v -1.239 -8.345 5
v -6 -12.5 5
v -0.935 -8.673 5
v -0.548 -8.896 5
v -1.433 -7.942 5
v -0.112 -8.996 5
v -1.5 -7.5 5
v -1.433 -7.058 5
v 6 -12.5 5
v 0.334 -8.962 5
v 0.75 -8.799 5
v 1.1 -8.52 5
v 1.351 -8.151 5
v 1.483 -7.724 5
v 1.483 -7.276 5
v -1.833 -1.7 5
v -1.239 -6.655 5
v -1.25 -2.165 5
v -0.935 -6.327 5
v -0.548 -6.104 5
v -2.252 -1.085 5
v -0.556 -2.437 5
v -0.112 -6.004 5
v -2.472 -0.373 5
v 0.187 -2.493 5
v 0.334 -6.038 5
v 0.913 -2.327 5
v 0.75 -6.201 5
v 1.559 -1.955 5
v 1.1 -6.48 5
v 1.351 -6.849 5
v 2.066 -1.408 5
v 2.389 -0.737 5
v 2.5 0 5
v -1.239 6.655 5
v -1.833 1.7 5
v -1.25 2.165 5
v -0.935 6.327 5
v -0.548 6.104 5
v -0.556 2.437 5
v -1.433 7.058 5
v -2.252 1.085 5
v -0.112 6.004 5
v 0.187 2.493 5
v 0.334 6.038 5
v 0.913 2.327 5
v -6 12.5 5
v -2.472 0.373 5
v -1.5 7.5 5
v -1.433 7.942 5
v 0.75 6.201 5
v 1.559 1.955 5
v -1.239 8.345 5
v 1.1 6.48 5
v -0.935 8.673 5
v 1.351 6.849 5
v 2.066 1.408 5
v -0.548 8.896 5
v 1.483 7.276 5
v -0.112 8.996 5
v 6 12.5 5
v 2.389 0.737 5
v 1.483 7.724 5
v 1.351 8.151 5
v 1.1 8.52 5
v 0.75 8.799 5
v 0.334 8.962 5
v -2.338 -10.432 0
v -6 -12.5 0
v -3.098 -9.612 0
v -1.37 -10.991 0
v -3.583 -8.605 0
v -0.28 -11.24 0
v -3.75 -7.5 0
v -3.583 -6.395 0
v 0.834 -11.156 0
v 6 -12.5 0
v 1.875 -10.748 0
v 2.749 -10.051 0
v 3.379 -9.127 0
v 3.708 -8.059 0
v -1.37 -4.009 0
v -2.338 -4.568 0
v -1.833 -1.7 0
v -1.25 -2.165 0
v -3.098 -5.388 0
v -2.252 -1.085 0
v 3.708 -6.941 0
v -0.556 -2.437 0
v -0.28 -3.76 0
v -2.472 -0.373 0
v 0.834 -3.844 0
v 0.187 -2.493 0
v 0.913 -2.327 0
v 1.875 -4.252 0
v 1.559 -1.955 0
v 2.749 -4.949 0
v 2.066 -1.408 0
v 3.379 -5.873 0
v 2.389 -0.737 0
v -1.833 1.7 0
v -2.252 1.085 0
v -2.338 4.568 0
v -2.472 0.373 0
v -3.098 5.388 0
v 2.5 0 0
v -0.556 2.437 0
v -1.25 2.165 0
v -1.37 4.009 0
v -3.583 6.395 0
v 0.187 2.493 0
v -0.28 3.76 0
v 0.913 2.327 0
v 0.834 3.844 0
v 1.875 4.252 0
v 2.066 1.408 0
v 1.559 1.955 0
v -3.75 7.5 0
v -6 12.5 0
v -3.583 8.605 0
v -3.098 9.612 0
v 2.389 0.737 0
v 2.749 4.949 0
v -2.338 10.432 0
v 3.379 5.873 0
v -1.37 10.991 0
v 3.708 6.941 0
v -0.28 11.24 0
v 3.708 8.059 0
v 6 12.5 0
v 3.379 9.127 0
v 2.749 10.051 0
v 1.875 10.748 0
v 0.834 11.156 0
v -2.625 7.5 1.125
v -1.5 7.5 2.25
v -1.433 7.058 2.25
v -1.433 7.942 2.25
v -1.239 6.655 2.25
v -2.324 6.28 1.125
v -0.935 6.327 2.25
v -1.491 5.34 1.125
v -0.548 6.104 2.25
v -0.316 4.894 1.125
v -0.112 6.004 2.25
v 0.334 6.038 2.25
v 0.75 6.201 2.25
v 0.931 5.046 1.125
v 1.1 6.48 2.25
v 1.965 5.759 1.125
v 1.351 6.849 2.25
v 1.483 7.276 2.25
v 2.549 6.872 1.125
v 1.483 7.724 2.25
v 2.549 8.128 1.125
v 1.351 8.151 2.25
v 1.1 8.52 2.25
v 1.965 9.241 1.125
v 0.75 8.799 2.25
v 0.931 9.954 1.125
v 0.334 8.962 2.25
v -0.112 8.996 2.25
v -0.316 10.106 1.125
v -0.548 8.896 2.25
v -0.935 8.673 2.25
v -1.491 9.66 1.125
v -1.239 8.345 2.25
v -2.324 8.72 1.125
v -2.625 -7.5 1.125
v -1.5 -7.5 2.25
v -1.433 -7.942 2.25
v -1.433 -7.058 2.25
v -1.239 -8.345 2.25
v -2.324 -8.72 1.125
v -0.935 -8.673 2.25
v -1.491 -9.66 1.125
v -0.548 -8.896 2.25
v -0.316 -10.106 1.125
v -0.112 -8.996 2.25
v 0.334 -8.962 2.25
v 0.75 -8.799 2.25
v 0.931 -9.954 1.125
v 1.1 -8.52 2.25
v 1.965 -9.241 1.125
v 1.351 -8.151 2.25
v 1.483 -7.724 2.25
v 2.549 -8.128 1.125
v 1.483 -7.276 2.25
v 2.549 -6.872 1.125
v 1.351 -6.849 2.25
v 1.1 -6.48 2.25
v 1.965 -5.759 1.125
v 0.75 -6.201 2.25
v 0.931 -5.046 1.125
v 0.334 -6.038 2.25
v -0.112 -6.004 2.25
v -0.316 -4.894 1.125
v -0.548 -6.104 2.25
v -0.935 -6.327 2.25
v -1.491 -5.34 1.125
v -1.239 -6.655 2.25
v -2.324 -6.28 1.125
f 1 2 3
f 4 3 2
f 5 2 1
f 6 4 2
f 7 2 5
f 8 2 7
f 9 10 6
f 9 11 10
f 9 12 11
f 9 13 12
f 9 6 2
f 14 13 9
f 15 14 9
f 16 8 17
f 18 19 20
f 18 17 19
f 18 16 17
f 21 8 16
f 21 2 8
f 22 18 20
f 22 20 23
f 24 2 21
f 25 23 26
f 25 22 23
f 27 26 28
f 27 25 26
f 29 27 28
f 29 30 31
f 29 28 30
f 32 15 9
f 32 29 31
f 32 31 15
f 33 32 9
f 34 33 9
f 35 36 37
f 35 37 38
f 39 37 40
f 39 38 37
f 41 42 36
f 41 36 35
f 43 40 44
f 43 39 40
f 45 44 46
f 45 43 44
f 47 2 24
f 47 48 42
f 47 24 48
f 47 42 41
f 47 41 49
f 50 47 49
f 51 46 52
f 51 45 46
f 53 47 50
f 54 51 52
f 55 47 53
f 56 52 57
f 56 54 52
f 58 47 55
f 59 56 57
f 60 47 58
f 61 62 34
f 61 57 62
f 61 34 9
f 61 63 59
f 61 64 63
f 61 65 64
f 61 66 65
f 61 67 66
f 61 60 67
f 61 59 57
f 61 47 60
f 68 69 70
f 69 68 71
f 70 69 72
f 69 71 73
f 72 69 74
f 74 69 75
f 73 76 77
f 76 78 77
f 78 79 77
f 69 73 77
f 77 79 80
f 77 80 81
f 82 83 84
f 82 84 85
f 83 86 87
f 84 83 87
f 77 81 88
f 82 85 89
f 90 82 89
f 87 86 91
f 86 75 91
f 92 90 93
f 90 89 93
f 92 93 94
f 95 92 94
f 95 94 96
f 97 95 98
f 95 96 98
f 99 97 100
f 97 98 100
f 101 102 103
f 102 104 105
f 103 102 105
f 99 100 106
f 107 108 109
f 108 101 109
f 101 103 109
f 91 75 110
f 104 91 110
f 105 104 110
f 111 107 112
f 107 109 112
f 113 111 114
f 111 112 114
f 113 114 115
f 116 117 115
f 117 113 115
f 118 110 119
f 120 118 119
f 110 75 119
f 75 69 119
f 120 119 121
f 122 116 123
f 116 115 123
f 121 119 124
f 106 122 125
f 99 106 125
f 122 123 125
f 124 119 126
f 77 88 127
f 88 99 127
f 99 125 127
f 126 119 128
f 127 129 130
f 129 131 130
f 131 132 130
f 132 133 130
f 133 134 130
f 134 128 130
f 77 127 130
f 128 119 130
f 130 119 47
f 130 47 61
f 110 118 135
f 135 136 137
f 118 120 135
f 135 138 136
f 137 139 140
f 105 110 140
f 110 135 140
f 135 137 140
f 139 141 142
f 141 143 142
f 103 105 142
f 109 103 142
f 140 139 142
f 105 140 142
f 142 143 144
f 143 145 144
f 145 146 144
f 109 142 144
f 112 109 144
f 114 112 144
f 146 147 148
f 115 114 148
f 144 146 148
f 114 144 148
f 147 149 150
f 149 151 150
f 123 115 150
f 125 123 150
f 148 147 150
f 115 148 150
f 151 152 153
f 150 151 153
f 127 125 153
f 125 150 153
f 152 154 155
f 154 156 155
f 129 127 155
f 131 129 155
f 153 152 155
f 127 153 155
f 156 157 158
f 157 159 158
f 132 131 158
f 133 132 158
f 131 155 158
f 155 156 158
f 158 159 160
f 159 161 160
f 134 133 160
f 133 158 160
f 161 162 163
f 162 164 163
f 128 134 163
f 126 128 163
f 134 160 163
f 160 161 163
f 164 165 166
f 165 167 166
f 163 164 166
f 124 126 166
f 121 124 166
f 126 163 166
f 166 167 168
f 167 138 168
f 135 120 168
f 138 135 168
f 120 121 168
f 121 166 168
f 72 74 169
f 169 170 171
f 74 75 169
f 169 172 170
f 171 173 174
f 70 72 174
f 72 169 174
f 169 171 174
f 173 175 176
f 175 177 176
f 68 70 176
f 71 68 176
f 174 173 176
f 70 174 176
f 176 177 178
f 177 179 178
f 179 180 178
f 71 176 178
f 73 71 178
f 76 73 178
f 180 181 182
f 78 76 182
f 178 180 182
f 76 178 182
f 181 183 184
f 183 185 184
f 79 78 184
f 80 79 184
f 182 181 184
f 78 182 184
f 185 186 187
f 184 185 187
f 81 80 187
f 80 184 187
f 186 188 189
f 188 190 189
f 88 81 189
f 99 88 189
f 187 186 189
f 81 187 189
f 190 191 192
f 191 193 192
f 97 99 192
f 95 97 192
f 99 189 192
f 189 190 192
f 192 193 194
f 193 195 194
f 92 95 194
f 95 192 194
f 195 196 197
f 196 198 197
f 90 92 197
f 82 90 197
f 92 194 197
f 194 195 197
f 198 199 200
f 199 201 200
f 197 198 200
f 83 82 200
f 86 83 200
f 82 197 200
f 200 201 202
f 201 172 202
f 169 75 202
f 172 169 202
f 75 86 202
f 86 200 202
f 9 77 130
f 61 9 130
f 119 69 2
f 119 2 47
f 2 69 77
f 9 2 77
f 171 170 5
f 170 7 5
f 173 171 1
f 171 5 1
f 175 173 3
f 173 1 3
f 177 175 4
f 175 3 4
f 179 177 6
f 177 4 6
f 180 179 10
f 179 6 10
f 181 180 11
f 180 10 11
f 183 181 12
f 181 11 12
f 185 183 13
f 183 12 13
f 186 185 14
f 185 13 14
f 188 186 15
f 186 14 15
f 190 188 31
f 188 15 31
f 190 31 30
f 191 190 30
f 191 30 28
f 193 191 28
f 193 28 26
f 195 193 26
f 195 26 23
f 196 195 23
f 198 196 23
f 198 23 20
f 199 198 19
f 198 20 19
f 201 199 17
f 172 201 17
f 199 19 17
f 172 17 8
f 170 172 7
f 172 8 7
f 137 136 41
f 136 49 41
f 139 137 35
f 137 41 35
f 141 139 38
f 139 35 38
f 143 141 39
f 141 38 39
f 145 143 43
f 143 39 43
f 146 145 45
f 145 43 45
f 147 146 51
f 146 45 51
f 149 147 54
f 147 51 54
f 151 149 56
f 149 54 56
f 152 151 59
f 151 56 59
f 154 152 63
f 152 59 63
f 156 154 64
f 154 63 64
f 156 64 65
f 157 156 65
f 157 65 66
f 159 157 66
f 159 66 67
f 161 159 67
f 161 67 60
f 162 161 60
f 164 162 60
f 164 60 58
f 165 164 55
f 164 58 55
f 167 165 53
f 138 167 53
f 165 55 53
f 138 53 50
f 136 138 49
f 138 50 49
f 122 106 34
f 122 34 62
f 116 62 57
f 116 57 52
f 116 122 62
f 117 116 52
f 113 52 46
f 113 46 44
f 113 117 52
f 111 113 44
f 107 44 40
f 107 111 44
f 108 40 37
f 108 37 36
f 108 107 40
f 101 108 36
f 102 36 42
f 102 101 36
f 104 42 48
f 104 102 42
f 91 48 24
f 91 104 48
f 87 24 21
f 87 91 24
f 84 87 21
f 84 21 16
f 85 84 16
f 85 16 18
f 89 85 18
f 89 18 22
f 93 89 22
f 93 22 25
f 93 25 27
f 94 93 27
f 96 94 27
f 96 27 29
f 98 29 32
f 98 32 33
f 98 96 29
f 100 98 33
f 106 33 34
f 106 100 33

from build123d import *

# Parameters (mm, degrees)
F0_W           = 12
F0_H           = 25
F0_R           = 2.5
F1_DEPTH       = 5
F3_D           = 3
F3_CSINK_D     = 7.5
F3_CSINK_ANGLE = 90


with BuildPart() as f1:
    # F0 (on Top) → F1 (new body)
    with BuildSketch(Plane.XY):
        Rectangle(F0_W, F0_H)
        Circle(F0_R, mode=Mode.SUBTRACT)
    extrude(amount=F1_DEPTH)

    # F3 (through all)
    with Locations(Plane(origin=(0, 0, 0), x_dir=(1, 0, 0), z_dir=(0, 0, -1))):
        with Locations((0, 7.5), (0, -7.5)):
            CounterSinkHole(F3_D / 2, F3_CSINK_D / 2, counter_sink_angle=F3_CSINK_ANGLE)


solid = f1.part
